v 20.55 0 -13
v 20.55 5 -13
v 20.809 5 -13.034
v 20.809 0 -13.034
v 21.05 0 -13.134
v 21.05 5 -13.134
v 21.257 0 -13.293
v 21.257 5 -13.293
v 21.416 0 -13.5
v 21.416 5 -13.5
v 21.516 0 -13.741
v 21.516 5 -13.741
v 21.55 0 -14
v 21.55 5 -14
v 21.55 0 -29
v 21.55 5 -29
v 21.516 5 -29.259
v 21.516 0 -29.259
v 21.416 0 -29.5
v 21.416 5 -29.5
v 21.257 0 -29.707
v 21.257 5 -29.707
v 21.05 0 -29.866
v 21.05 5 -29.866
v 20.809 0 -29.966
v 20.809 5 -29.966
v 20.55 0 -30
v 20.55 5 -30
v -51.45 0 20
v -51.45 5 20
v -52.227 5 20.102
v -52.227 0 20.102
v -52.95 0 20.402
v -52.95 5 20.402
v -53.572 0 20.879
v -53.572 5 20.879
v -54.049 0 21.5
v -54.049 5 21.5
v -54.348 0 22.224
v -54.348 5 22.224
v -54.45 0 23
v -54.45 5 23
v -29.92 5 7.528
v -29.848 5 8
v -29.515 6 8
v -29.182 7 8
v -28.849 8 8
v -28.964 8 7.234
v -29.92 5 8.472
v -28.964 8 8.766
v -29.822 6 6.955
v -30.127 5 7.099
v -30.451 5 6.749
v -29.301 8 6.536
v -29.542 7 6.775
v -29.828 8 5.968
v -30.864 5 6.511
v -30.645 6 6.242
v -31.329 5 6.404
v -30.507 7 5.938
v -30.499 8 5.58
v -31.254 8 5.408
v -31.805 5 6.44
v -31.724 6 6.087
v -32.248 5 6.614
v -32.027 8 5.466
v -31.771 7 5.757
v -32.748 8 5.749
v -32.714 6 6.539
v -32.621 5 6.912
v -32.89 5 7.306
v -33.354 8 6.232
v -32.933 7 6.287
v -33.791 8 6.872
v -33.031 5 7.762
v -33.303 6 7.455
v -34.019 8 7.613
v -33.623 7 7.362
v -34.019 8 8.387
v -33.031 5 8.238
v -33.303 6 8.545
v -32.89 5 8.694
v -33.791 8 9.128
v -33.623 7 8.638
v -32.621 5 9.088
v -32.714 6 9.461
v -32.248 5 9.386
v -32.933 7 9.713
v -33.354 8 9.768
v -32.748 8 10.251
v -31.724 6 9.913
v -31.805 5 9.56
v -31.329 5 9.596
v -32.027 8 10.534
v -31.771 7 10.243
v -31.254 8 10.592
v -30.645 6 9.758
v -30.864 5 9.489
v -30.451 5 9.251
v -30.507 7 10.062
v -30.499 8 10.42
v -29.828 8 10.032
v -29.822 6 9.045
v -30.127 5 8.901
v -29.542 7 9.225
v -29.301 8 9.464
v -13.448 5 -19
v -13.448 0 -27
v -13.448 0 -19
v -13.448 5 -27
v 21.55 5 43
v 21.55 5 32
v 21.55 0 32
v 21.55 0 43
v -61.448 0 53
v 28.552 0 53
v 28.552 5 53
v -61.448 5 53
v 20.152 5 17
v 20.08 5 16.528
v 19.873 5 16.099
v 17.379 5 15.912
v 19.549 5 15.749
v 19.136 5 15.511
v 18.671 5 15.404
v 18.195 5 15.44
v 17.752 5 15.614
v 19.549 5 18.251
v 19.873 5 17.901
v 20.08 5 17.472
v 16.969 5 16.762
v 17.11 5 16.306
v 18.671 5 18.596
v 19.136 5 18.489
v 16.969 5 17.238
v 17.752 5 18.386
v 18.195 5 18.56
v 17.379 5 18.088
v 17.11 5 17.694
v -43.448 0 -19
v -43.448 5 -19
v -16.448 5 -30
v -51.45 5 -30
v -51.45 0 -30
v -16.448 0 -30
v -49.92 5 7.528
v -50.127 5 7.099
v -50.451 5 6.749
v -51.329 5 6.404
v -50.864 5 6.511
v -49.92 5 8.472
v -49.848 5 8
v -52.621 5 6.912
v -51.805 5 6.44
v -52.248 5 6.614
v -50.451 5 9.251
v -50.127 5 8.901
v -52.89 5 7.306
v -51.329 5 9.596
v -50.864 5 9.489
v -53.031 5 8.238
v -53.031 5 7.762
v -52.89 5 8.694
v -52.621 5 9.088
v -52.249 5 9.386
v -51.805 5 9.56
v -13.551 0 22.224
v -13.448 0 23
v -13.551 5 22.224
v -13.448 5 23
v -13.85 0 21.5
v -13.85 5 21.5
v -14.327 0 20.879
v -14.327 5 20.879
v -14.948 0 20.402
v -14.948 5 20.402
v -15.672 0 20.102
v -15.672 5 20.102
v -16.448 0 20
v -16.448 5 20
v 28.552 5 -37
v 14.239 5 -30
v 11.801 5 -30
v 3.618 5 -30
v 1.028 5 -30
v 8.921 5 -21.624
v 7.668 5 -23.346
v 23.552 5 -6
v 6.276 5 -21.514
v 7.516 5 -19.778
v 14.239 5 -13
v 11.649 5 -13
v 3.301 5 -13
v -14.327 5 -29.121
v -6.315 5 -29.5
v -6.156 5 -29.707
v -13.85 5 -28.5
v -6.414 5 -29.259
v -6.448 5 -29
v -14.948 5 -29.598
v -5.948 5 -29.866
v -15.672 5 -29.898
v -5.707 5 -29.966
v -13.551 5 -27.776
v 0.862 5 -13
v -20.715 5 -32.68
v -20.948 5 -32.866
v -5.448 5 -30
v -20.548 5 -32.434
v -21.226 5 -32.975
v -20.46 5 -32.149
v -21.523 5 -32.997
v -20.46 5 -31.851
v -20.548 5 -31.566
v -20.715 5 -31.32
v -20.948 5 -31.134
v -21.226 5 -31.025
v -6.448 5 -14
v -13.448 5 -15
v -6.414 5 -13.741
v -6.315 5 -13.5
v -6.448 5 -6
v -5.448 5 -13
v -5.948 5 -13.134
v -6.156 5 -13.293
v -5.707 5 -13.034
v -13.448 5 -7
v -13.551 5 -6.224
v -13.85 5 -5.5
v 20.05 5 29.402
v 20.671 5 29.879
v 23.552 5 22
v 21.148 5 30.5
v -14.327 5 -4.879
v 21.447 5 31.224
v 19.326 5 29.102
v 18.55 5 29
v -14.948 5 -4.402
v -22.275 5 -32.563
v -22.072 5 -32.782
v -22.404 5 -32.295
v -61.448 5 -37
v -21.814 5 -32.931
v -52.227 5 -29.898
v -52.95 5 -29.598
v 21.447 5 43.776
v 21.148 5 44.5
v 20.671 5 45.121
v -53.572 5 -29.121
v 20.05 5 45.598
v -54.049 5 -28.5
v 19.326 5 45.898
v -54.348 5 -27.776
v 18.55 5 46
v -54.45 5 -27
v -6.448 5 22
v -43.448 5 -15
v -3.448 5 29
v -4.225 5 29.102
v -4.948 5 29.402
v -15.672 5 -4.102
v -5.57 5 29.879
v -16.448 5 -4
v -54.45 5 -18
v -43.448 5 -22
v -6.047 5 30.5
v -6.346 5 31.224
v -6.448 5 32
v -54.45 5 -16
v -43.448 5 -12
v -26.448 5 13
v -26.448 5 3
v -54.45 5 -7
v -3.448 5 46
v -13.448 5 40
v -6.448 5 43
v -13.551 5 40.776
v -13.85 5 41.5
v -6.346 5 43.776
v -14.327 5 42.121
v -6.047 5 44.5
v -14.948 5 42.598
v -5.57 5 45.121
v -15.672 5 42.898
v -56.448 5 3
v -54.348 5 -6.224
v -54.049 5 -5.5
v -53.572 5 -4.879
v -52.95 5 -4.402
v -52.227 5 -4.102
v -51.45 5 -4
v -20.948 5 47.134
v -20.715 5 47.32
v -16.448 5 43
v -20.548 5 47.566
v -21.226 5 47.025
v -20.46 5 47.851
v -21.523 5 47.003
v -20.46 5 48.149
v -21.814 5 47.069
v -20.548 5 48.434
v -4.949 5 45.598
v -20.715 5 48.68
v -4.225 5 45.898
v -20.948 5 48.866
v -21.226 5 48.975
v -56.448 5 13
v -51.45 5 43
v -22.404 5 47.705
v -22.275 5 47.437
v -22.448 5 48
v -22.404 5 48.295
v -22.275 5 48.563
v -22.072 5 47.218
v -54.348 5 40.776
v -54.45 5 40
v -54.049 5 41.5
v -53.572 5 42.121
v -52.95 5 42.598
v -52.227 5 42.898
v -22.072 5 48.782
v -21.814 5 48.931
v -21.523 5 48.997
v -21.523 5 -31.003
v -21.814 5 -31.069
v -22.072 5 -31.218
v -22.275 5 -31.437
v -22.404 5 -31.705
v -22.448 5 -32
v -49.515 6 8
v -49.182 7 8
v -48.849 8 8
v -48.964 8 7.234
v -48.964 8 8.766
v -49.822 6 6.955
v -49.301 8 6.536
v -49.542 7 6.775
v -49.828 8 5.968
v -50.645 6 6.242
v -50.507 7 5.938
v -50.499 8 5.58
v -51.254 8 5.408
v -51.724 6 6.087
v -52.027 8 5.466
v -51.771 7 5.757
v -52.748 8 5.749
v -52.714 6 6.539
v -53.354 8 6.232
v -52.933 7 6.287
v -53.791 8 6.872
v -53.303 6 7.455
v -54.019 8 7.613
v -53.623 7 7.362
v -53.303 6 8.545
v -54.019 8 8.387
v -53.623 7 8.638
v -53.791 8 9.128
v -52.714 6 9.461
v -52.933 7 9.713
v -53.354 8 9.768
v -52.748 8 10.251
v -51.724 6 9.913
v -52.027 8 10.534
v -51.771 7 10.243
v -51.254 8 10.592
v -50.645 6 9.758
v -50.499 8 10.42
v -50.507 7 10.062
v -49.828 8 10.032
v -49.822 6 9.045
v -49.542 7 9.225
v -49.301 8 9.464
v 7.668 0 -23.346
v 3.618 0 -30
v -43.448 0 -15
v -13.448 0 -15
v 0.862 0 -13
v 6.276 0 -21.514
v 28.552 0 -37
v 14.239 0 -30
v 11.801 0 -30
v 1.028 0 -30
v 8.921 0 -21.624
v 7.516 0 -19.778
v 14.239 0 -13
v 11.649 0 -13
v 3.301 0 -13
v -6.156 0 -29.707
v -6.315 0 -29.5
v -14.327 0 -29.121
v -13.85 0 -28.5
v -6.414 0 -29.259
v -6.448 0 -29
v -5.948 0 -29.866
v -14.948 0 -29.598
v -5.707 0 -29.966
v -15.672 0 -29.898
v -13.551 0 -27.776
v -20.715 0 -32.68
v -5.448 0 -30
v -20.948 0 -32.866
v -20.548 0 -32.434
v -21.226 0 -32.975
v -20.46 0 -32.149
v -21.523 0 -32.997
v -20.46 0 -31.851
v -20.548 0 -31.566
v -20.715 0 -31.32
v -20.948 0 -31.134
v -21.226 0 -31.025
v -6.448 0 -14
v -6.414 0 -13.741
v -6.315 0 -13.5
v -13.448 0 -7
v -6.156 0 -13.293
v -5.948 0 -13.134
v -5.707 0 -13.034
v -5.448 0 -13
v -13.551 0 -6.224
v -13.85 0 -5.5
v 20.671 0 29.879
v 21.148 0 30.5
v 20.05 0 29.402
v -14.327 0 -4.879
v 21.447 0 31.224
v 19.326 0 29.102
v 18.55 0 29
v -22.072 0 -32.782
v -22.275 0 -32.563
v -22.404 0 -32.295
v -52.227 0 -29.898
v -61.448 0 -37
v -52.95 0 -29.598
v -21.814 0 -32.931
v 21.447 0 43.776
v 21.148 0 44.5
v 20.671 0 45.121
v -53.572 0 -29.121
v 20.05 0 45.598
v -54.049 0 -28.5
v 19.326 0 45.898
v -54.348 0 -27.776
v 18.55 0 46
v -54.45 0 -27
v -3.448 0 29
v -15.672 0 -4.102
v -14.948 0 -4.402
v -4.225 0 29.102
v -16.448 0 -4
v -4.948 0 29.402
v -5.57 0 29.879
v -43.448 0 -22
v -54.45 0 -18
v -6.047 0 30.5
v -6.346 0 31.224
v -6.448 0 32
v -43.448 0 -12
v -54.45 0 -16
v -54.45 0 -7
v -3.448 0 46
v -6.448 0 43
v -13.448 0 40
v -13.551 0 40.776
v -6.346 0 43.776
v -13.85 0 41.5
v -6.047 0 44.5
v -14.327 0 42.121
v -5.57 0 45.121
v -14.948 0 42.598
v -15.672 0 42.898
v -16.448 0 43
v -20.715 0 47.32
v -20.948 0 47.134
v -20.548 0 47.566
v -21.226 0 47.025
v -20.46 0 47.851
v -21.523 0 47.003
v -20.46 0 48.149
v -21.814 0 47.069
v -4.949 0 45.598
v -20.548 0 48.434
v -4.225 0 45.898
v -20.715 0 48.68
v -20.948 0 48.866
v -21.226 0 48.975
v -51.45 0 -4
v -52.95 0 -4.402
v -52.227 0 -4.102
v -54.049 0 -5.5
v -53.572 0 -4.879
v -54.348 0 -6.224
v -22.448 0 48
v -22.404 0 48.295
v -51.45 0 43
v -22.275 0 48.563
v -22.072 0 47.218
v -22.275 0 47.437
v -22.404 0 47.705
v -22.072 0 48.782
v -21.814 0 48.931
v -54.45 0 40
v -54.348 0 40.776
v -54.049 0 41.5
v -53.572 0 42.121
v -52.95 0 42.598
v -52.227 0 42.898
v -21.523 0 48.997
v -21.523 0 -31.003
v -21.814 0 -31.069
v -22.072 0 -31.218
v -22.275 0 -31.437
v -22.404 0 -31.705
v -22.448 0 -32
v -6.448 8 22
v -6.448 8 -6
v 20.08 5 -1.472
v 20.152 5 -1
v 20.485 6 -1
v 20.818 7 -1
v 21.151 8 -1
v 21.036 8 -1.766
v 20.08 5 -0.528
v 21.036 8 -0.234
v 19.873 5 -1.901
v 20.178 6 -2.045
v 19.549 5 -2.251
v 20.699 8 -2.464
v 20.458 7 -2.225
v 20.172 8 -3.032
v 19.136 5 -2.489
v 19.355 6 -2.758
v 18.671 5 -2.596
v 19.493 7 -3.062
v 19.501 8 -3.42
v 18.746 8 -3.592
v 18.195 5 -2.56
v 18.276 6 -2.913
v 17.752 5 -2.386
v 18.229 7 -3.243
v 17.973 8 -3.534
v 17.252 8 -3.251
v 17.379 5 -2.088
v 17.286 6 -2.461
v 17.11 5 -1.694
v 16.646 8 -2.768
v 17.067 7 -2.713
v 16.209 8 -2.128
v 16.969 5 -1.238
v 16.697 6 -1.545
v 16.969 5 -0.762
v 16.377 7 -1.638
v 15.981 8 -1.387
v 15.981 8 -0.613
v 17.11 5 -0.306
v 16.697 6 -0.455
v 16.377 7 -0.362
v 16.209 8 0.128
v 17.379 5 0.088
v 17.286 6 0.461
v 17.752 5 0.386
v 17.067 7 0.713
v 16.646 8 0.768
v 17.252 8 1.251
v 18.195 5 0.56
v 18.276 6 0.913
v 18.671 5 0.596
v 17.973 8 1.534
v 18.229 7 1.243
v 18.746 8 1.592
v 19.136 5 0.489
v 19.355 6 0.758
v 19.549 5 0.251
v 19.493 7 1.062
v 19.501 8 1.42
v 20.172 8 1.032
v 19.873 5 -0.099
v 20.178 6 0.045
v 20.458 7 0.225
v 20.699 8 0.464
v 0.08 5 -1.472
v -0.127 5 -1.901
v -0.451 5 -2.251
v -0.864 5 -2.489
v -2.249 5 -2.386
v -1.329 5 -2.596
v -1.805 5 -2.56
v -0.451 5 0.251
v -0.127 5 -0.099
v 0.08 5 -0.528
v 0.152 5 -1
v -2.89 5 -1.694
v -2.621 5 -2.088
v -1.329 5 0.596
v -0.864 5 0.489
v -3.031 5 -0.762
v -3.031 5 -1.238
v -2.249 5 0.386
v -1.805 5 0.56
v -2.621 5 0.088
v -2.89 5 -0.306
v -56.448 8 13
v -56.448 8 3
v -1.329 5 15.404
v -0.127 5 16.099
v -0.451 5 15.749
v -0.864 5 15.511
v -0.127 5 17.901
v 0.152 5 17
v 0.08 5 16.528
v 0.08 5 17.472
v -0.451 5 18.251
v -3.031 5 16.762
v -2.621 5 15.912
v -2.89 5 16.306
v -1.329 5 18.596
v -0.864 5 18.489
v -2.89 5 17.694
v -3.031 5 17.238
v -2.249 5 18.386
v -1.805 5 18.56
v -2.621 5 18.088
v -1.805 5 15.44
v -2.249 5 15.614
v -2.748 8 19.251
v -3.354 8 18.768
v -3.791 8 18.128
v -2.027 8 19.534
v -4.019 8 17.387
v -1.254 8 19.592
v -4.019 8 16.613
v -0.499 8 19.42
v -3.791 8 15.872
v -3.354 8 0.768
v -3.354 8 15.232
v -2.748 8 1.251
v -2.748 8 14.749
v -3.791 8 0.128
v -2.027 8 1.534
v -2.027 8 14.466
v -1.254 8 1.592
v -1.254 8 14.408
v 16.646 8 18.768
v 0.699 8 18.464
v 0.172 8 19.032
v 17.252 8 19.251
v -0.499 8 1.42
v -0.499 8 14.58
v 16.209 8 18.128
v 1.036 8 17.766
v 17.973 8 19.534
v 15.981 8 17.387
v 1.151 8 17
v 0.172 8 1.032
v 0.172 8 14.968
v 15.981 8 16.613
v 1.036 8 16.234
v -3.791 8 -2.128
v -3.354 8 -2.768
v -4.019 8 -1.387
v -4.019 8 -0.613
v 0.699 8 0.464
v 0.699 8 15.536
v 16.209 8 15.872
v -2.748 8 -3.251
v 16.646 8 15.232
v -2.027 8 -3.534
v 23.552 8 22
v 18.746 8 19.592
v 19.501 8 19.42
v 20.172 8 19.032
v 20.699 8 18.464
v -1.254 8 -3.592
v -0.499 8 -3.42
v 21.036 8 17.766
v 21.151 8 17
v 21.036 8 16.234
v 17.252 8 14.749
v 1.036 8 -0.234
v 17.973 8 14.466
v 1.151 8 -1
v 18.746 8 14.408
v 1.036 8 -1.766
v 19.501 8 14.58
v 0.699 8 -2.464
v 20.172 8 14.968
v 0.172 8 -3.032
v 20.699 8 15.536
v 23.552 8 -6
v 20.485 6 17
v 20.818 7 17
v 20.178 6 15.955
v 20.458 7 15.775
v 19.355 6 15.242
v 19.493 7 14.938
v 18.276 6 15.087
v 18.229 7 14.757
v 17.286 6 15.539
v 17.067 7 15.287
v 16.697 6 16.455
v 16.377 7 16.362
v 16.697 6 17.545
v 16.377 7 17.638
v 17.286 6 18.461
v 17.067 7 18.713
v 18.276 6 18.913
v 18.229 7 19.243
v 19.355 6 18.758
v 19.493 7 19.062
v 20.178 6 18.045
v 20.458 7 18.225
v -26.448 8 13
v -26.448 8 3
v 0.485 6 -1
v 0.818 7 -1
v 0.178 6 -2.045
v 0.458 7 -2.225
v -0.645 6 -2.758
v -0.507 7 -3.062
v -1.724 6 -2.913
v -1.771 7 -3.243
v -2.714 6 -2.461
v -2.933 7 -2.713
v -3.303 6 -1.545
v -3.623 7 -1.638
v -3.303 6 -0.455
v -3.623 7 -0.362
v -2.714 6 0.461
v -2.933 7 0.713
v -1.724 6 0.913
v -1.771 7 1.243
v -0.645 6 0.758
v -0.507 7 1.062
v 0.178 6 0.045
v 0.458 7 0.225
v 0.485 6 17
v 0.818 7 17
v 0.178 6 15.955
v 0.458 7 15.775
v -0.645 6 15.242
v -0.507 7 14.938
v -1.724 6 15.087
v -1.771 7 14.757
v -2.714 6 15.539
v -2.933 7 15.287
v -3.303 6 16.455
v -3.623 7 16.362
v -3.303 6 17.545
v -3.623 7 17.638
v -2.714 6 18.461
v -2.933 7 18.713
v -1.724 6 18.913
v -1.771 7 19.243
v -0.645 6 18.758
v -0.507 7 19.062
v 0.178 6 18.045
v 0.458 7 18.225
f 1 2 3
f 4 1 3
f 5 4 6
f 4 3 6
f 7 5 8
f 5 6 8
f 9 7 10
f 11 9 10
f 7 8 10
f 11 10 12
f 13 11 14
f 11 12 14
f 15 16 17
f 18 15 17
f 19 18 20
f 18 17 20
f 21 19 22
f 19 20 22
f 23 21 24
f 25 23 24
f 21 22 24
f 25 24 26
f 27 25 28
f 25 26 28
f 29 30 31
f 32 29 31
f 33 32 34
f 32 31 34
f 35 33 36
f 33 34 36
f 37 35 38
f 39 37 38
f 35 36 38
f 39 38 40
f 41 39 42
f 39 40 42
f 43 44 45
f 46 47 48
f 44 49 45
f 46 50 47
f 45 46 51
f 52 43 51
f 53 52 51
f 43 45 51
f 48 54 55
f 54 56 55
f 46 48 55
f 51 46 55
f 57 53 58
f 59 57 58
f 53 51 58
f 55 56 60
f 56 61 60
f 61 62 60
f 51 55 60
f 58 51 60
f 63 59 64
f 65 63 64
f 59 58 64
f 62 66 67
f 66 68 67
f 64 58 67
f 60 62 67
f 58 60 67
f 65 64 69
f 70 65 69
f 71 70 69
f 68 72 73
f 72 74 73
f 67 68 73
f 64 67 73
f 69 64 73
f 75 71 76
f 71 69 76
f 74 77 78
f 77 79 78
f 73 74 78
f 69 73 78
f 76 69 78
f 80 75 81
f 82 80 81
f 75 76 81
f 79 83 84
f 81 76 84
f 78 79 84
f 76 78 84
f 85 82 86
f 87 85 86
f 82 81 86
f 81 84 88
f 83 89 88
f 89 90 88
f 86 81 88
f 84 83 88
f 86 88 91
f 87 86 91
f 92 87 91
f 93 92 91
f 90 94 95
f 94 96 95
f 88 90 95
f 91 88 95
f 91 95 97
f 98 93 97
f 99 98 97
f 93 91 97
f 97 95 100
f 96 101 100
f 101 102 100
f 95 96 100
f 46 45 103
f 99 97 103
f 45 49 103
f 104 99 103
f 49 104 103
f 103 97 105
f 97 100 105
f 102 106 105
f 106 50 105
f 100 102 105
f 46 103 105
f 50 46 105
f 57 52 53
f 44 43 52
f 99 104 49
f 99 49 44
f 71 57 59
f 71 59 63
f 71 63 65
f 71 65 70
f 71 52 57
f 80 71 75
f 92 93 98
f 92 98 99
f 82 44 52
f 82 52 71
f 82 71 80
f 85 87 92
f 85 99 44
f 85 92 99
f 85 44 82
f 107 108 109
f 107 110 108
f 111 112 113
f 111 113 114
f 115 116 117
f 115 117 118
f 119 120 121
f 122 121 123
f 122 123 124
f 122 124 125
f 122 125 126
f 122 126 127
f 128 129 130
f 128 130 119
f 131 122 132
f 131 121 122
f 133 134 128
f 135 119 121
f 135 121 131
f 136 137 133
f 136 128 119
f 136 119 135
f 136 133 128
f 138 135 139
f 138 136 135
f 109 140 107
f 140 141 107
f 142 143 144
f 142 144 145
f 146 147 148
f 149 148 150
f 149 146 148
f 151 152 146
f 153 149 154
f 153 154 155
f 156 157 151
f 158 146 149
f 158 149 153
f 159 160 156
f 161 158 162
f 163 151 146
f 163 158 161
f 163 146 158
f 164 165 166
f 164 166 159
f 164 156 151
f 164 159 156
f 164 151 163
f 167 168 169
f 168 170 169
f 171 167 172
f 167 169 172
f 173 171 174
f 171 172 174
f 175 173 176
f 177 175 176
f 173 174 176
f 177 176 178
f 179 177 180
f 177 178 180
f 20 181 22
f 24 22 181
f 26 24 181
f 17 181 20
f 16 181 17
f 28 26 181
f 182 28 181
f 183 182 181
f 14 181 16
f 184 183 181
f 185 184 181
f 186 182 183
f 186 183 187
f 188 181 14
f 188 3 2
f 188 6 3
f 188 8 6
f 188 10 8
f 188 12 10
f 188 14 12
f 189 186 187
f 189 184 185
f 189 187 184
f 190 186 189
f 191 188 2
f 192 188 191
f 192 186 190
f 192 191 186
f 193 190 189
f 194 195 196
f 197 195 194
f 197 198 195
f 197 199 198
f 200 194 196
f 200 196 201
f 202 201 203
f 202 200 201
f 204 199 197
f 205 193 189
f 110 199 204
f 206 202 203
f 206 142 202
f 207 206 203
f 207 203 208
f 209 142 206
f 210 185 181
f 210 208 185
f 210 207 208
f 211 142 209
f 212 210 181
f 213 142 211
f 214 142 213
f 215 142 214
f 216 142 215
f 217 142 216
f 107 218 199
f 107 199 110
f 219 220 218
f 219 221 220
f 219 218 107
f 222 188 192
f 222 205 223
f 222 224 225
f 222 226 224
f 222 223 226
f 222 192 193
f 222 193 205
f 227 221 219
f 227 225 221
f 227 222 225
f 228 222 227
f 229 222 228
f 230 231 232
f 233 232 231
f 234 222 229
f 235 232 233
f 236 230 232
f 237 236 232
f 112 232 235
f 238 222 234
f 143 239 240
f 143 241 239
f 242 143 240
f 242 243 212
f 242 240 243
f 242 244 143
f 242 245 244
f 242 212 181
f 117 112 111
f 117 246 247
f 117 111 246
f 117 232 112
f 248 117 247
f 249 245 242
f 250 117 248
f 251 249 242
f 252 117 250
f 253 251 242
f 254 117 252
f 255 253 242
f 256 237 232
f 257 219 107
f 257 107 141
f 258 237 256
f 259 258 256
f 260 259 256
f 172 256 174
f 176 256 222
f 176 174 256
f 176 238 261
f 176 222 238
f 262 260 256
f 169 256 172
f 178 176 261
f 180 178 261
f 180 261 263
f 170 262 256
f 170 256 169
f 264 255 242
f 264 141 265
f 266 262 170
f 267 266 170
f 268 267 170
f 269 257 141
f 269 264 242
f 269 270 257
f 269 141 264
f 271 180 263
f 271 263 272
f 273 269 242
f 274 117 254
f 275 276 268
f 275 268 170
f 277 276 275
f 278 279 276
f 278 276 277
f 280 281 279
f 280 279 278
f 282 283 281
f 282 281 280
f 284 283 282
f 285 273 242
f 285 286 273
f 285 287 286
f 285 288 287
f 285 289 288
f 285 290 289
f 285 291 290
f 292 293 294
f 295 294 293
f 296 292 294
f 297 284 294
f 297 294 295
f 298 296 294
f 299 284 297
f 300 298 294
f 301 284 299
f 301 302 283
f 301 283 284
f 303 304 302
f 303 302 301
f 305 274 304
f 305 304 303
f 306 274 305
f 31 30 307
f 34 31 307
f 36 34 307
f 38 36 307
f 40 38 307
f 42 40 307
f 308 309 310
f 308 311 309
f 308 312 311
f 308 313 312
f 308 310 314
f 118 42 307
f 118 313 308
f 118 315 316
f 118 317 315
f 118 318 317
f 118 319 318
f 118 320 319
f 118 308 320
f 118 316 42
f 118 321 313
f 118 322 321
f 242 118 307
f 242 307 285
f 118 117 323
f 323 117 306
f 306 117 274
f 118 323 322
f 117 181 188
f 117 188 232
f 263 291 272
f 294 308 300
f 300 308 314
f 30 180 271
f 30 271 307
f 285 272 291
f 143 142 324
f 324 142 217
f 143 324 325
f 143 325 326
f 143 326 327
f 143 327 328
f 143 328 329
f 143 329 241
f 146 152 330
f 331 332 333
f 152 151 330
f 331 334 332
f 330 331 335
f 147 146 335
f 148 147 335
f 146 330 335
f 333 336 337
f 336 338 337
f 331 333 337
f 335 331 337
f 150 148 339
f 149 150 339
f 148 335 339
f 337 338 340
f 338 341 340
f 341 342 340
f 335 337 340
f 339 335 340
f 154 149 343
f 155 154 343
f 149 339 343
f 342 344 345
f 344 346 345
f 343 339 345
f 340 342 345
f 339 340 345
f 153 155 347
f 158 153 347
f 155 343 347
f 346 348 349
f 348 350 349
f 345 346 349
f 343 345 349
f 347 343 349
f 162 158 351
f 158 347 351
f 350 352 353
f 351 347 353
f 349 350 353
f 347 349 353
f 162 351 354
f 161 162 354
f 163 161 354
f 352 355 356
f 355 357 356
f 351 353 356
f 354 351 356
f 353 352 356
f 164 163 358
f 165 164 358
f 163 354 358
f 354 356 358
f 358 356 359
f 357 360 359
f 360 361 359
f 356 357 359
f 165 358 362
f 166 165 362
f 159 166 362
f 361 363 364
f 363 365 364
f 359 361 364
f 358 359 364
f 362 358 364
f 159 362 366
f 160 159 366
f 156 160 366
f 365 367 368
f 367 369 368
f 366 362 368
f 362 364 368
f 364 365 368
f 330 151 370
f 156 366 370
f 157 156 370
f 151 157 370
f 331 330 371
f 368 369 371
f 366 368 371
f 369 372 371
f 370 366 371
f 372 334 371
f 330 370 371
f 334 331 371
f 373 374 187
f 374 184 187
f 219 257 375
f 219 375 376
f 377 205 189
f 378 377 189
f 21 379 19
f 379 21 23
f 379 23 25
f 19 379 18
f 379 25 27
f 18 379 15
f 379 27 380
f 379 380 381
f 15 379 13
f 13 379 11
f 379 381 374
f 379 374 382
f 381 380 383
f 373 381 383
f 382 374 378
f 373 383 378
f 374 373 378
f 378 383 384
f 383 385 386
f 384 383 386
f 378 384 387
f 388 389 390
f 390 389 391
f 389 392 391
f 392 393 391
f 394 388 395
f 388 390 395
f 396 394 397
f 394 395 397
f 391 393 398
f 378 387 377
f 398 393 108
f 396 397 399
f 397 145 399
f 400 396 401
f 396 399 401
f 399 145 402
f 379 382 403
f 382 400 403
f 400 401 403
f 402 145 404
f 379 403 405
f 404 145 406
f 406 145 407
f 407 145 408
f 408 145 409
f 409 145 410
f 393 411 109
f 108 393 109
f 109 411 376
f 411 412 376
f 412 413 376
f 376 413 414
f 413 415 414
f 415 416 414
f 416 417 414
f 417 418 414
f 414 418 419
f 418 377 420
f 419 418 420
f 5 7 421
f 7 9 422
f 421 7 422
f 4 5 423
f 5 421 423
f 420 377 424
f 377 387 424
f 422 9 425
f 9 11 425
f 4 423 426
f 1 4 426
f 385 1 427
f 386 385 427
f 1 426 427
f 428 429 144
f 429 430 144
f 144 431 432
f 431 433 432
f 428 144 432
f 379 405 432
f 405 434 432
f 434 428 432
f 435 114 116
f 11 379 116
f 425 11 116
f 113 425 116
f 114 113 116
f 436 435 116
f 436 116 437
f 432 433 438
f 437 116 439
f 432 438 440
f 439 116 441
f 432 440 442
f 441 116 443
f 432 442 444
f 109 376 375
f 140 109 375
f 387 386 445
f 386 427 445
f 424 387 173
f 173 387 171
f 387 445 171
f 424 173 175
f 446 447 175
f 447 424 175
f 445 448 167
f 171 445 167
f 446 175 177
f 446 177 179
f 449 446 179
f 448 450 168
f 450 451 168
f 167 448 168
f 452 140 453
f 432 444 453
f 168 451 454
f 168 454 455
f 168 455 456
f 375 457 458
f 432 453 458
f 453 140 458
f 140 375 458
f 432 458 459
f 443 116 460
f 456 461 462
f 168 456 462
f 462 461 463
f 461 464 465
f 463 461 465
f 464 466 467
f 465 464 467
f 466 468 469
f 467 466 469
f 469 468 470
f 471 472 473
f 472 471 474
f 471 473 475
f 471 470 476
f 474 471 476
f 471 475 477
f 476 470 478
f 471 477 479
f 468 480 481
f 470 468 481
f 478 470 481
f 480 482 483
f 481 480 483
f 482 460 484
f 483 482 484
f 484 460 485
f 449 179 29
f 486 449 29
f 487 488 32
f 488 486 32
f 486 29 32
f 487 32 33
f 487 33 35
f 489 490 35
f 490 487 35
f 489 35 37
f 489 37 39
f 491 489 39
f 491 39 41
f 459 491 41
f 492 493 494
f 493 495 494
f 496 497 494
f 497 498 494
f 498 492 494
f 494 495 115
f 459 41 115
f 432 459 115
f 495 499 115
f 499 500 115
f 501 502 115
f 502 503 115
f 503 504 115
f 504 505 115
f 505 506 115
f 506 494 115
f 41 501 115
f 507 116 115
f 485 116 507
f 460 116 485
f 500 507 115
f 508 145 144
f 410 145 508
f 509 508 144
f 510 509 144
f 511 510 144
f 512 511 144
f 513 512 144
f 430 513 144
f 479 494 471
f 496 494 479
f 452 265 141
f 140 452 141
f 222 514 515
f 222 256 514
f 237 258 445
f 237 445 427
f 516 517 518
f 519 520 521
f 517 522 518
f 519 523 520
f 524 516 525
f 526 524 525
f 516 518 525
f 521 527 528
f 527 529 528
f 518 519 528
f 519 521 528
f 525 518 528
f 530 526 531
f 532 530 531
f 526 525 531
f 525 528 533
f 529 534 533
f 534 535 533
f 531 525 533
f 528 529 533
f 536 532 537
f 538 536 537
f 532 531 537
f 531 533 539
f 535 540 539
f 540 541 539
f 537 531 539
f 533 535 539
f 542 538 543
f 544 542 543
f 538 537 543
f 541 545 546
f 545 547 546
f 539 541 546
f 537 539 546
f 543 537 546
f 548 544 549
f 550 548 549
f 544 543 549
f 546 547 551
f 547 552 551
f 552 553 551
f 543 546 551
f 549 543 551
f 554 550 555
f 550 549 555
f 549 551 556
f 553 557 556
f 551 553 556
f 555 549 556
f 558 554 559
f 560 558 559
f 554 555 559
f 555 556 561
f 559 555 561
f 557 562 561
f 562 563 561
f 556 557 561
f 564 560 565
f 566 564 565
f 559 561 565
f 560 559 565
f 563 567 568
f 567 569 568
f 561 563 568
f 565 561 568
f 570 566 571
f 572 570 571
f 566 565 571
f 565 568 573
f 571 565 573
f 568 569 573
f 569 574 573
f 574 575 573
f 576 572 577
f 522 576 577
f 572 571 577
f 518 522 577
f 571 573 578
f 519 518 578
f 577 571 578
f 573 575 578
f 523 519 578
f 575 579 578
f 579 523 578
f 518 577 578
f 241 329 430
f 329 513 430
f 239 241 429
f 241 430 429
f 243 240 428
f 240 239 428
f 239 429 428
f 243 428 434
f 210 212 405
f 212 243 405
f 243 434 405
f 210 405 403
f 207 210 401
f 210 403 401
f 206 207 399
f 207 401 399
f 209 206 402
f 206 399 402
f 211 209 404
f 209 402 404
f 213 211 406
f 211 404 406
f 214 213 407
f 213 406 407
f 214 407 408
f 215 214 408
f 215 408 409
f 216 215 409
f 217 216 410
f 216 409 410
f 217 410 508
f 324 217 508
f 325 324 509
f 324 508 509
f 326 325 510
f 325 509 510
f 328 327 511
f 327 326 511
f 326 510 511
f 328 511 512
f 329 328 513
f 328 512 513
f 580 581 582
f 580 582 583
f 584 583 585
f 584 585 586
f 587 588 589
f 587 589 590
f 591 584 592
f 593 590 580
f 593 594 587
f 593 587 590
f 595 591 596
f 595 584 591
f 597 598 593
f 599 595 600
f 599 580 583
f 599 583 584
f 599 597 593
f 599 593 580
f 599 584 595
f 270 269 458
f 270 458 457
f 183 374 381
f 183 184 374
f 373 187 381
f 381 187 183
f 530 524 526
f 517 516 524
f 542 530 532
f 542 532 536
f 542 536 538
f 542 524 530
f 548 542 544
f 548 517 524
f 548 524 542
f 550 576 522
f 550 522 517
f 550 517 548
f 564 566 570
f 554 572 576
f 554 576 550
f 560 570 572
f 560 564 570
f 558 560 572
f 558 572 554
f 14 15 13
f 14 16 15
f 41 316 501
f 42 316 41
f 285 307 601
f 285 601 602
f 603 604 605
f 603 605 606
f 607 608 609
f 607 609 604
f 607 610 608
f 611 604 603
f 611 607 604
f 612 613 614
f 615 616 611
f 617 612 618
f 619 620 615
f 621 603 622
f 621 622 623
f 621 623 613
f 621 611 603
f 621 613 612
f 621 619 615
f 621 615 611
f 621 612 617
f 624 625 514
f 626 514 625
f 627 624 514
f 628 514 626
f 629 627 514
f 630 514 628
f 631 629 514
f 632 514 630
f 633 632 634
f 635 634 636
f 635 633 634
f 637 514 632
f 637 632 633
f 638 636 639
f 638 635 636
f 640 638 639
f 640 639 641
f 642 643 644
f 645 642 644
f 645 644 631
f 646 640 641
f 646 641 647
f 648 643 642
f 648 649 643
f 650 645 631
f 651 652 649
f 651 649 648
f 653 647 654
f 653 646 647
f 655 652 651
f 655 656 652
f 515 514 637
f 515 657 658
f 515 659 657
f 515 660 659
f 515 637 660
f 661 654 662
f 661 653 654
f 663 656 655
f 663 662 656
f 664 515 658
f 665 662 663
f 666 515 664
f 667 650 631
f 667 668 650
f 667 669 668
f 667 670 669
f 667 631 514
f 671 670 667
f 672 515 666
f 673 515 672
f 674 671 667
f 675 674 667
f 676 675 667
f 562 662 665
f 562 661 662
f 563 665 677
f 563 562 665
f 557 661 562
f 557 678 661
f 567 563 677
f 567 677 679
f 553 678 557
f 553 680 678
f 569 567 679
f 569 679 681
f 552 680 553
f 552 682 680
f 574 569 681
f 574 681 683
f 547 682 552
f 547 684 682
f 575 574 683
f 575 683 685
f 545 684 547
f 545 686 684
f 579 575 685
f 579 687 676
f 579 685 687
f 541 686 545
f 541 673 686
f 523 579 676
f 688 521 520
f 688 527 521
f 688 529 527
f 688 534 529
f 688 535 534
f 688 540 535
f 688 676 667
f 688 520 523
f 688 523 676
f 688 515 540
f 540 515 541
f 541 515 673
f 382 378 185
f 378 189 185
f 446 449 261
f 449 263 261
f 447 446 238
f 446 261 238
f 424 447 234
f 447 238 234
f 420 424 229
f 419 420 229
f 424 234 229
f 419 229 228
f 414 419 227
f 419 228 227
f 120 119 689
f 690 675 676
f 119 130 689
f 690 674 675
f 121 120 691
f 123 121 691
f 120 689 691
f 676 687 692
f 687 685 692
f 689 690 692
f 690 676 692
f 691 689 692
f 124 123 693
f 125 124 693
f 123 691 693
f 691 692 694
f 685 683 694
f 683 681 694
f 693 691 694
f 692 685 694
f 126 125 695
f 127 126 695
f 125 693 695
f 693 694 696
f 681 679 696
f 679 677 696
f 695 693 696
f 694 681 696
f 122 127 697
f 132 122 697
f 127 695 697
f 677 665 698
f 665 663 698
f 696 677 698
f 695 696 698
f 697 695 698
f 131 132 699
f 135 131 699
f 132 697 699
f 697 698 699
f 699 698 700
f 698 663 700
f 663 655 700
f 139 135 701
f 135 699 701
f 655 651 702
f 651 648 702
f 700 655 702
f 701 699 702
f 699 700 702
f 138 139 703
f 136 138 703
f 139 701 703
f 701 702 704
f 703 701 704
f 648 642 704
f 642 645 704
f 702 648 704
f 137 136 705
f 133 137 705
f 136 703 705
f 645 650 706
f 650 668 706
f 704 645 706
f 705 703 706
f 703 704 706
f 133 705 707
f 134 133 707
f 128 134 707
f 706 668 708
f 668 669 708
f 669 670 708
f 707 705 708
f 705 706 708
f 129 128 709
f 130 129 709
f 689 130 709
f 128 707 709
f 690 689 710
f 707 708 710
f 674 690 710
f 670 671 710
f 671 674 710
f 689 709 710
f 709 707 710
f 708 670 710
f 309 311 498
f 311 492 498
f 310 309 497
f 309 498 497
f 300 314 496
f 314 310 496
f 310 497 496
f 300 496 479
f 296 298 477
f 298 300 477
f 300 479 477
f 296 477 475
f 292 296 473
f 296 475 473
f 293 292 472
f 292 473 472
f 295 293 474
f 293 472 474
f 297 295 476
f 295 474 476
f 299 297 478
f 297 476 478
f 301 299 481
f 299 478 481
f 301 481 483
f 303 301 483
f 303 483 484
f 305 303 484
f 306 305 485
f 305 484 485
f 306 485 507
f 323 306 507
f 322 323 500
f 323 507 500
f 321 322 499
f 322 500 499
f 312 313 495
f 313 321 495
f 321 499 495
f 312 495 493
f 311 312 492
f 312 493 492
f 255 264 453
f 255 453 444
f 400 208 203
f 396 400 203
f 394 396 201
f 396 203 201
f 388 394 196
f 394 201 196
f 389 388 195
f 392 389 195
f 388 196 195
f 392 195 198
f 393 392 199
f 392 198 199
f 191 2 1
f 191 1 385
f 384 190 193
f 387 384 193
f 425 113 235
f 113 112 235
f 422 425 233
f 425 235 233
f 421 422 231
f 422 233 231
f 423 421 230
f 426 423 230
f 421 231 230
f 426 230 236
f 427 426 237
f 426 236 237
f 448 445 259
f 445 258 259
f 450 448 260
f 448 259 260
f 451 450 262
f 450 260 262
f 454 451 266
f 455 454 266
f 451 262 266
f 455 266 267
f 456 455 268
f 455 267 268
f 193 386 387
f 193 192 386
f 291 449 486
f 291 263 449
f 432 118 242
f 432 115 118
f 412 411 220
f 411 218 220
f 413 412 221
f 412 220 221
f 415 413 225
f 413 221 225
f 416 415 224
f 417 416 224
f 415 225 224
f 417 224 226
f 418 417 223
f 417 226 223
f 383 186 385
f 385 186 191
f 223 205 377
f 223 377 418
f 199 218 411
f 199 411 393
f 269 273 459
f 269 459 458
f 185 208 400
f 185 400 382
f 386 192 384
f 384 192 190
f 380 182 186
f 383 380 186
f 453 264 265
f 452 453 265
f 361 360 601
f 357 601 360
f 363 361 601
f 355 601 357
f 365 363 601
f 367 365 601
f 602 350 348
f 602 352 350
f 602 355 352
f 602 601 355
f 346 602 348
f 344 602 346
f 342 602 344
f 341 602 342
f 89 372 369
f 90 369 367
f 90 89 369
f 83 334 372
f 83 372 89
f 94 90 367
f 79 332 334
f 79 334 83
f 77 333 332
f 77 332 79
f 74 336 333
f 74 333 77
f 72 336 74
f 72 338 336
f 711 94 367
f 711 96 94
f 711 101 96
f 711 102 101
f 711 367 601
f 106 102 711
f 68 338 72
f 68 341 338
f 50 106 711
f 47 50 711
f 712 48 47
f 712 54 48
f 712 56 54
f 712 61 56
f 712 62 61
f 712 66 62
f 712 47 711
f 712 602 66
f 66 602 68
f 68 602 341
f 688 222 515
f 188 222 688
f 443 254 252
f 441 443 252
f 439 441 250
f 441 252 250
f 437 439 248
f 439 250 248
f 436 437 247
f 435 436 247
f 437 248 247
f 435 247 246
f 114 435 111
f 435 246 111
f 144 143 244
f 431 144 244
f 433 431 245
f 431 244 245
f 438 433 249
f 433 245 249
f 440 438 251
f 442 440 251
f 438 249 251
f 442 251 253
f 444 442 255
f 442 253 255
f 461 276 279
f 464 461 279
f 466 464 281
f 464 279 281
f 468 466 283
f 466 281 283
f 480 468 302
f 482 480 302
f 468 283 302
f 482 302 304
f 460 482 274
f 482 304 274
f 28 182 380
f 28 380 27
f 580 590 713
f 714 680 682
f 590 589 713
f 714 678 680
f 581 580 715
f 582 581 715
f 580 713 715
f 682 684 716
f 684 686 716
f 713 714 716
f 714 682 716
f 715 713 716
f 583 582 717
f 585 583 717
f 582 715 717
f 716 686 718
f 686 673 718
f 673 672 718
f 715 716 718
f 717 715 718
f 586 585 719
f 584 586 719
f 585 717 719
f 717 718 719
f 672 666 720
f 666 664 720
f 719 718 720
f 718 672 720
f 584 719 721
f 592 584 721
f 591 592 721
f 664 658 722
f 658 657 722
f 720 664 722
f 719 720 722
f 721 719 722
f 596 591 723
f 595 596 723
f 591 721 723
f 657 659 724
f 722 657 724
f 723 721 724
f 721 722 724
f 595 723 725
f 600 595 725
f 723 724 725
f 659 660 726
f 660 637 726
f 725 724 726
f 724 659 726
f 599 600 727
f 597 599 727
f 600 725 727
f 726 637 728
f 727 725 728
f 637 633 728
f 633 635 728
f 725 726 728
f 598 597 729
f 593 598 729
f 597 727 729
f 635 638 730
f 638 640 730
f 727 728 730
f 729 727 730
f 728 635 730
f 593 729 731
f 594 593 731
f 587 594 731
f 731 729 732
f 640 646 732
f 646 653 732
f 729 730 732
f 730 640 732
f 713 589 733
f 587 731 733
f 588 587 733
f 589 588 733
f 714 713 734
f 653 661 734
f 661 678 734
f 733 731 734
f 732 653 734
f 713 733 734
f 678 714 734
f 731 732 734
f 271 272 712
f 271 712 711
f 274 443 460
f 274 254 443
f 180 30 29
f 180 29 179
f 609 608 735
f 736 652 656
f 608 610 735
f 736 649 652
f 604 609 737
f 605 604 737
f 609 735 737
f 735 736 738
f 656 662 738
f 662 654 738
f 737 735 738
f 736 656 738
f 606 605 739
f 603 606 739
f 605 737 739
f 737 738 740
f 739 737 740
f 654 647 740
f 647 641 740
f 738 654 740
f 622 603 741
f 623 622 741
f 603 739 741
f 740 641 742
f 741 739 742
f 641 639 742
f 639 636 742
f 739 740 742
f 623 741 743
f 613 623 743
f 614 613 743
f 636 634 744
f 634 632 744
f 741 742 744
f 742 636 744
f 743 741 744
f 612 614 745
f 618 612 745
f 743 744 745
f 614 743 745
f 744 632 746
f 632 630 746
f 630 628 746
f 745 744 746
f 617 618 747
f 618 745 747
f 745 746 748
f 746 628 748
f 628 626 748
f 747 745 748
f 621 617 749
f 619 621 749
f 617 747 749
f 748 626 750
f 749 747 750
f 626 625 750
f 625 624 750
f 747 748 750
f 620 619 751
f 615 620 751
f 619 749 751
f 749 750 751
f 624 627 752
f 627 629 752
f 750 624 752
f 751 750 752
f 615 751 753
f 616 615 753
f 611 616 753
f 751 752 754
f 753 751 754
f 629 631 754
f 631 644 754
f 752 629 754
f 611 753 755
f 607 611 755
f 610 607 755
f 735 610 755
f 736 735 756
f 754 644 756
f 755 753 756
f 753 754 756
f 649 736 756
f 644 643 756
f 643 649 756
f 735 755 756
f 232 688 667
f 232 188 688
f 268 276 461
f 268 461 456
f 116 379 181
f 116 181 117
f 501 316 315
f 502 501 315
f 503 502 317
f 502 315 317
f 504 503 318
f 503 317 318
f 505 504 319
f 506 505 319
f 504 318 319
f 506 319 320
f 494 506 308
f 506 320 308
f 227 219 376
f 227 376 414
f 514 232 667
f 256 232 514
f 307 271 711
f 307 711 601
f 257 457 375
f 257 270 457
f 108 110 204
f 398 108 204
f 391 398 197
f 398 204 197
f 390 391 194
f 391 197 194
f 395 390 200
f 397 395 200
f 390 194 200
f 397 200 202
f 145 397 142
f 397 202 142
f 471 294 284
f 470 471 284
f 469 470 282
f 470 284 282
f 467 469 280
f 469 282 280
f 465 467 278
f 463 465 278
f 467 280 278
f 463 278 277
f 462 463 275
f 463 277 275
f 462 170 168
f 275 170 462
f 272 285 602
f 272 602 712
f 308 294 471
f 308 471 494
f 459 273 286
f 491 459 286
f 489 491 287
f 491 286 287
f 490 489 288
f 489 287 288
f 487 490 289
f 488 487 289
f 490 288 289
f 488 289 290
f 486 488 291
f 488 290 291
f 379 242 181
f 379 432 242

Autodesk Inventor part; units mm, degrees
ref_plane "YZ Plane" through (0, 0, 0) normal (1, 0, 0) x (0, 1, 0)
ref_plane "Arbeitsebene1" through (-21.4485, 99.4, 5.4) normal (-1, 0, 0) x (0, -0.6026, -0.798)
sketch "center1" plane through (-21.4485, 99.4, 5.4) normal (-1, 0, 0) x (0, -0.6026, -0.798)
  line L0 (125.8462, -4.4299) -> (-42.8597, 122.9603)
  line L1 (111.6965, 152.237) -> (-23.2865, -26.5243)
  point P0 (64.2081, 76.0713)
ref_plane "Arbeitsebene2" through (53.5515, 27.1, 8) normal (0, 0, -1) x (0, 1, 0)
sketch "center2" plane through (53.5515, 27.1, 8) normal (0, 0, -1) x (0, 1, 0)
  line L0 (0, 239.86) -> (0, -220.81)
  point P0 (-27.1, -53.5515)
sketch "Hallsensor" plane through (0, 0, 0) normal (0, 1, 0) x (-1, 0, 0)
  line L0 (21.4485, 13) -> (41.4485, 13) construction
  line L1 (41.4485, 13) -> (41.4485, 3) construction
  line L2 (41.4485, 3) -> (21.4485, 3) construction
  line L3 (21.4485, 3) -> (21.4485, 13) construction
  line L4 (21.4485, -97.7) -> (21.4485, 113.7) construction
  line L5 (-293.4115, 8) -> (167.2585, 8) construction
  line L6 (40.4485, 4) -> (42.4485, 4)
  line L7 (42.4485, 4) -> (42.4485, 2)
  line L8 (42.4485, 2) -> (40.4485, 2)
  line L9 (40.4485, 2) -> (40.4485, 4)
  line L10 (40.4485, 4) -> (42.4485, 2) construction
  line L11 (42.4485, 4) -> (40.4485, 2) construction
  line L12 (22.4485, 4) -> (20.4485, 4)
  line L13 (20.4485, 4) -> (20.4485, 2)
  line L14 (20.4485, 2) -> (22.4485, 2)
  line L15 (22.4485, 2) -> (22.4485, 4)
  line L16 (22.4485, 4) -> (20.4485, 2) construction
  line L17 (20.4485, 4) -> (22.4485, 2) construction
  line L18 (22.4485, 14) -> (20.4485, 14)
  line L19 (20.4485, 14) -> (20.4485, 12)
  line L20 (20.4485, 12) -> (22.4485, 12)
  line L21 (22.4485, 12) -> (22.4485, 14)
  line L22 (22.4485, 14) -> (20.4485, 12) construction
  line L23 (20.4485, 14) -> (22.4485, 12) construction
  line L24 (42.4485, 14) -> (40.4485, 14)
  line L25 (40.4485, 14) -> (40.4485, 12)
  line L26 (40.4485, 12) -> (42.4485, 12)
  line L27 (42.4485, 12) -> (42.4485, 14)
  line L28 (42.4485, 14) -> (40.4485, 12) construction
  line L29 (40.4485, 14) -> (42.4485, 12) construction
  line L30 (51.4485, -1) -> (1.4485, -1) construction
  line L31 (1.4485, -1) -> (1.4485, 17) construction
  line L32 (1.4485, 17) -> (51.4485, 17) construction
  line L33 (51.4485, 17) -> (51.4485, -1) construction
  circle A0 centre (51.4485, 8) radius 1.5
  circle A1 centre (1.4485, -1) radius 1.5
  circle A2 centre (1.4485, 17) radius 1.5
  point P0 (0, 0)
  point P1 (21.4485, 3)
  point P2 (21.4485, 3)
  dimension "d70" = 20
  dimension "d71" = 10
  dimension "d72" = 2
  dimension "d73" = 4
  dimension "d74" = 4
  dimension "d75" = 20
  dimension "d76" = 10
  dimension "d77" = 3
  dimension "d78" = 5
sketch "Groundplane" plane through (0, 0, 0) normal (0, 1, 0) x (-1, 0, 0)
  line L0 (-293.4115, 8) -> (167.2585, 8) construction
  line L1 (21.4485, -97.7) -> (21.4485, 113.7) construction
  arc A0 (22.4485, -32) -> (20.4485, -32) centre (21.4485, -32) ccw construction
  line L2 (22.4485, -32) -> (20.4485, -32) construction
  line L3 (20.4485, -32) -> (20.4485, -37) construction
  line L4 (20.4485, -37) -> (22.4485, -37) construction
  line L5 (22.4485, -37) -> (22.4485, -32) construction
  arc A1 (20.4485, 48) -> (22.4485, 48) centre (21.4485, 48) ccw construction
  line L6 (20.4485, 48) -> (22.4485, 48) construction
  line L7 (22.4485, 48) -> (22.4485, 53) construction
  line L8 (22.4485, 53) -> (20.4485, 53) construction
  line L9 (20.4485, 53) -> (20.4485, 48) construction
  line L10 (61.4485, -37) -> (-28.5515, -37) construction
  line L11 (-28.5515, -37) -> (-28.5515, 53) construction
  line L12 (-28.5515, 53) -> (61.4485, 53) construction
  line L13 (61.4485, 53) -> (61.4485, -37) construction
  dimension "d87" = 5
  dimension "d88" = 2
  dimension "d89" = 2
  dimension "d90" = 5
  dimension "d91" = 90
  dimension "d92" = 45
  dimension "d97" = 50
  dimension "d98" = 90
sketch "Montagepunkte" plane through (0, 0, 0) normal (0, 1, 0) x (-1, 0, 0)
  circle A0 centre (51.4485, 8) radius 1.5 construction
  circle A1 centre (1.4485, -1) radius 1.5 construction
  circle A2 centre (1.4485, 17) radius 1.5 construction
  line L0 (1.4485, -1) -> (-18.5515, -1) construction
  line L1 (-18.5515, -1) -> (-18.5515, 17) construction
  line L2 (-18.5515, 17) -> (1.4485, 17) construction
  line L3 (1.4485, 17) -> (1.4485, -1) construction
  line L4 (51.4485, 8) -> (31.4485, 8) construction
  circle A3 centre (31.4485, 8) radius 1.6
  circle A4 centre (51.4485, 8) radius 1.6
  circle A5 centre (1.4485, -1) radius 1.6
  circle A6 centre (1.4485, 17) radius 1.6
  circle A7 centre (-18.5515, 17) radius 1.6
  circle A8 centre (-18.5515, -1) radius 1.6
  arc A9 (22.4485, -32) -> (20.4485, -32) centre (21.4485, -32) ccw construction
  arc A10 (20.4485, 48) -> (22.4485, 48) centre (21.4485, 48) ccw construction
  circle A11 centre (21.4485, -32) radius 1
  circle A12 centre (21.4485, 48) radius 1
  dimension "d93" = 20
  dimension "d94" = 20
  dimension "d95" = 3.2
  dimension "d96" = 2
sketch "Skizze5" plane through (0, 0, 0) normal (0, 1, 0) x (-1, 0, 0)
  line L0 (-293.4115, 8) -> (167.2585, 8) construction
  circle A0 centre (21.4485, -32) radius 1 projected
  circle A1 centre (21.4485, 48) radius 1 projected
  line L1 (61.4485, -37) -> (-28.5515, -37) projected
  line L2 (61.4485, 53) -> (61.4485, -37) projected
  line L3 (-28.5515, -37) -> (-28.5515, 53) projected
  line L4 (-28.5515, 53) -> (61.4485, 53) projected
extrude "Extrusion2" add sketch "Skizze5" along normal blind 5
sketch "Skizze6" plane through (0, 5, 0) normal (0, 1, 0) x (1, 0, 0)
  line L0 (-56.4485, -3) -> (-26.4485, -3)
  line L1 (-26.4485, -3) -> (-26.4485, -13)
  line L2 (-26.4485, -13) -> (-56.4485, -13)
  line L3 (-56.4485, -13) -> (-56.4485, -3)
  line L4 (-6.4485, 6) -> (23.5515, 6)
  line L5 (23.5515, 6) -> (23.5515, -22)
  line L6 (23.5515, -22) -> (-6.4485, -22)
  line L7 (-6.4485, -22) -> (-6.4485, 6)
  circle A0 centre (-51.4485, -8) radius 1.6 projected
  circle A1 centre (-31.4485, -8) radius 1.6 projected
  circle A2 centre (-1.4485, -17) radius 1.6 projected
  circle A3 centre (18.5515, -17) radius 1.6 projected
  circle A4 centre (18.5515, 1) radius 1.6 projected
  circle A5 centre (-1.4485, 1) radius 1.6 projected
  point P0 (0, 0)
  dimension "d99" = 5
  dimension "d100" = 5
  dimension "d101" = 5
  dimension "d102" = 5
  dimension "d103" = 5
  dimension "d104" = 5
  dimension "d105" = 5
  dimension "d106" = 5
extrude "Extrusion3" add sketch "Skizze6" along normal blind 3
chamfer "Fase1" distance 1 distance2 3 2 edges at (-53.0485, 8, 8) (-33.0485, 8, 8) measured on face at (-38.3043, 8, 4.168)
chamfer "Fase2" distance 1 distance2 3 4 edges at (-3.0485, 8, -1) (16.9515, 8, -1) (16.9515, 8, 17) (-3.0485, 8, 17) measured on face at (11.4857, 8, 5.3537)
sketch "Skizze7" plane through (0, 5, 0) normal (0, 1, 0) x (1, 0, 0)
  line L0 (-51.4505, 30) -> (-16.4485, 30)
  line L1 (-13.4485, 27) -> (-13.4485, 7)
  line L2 (-16.4485, 4) -> (-51.4505, 4)
  line L3 (-54.4505, 7) -> (-54.4505, 27)
  line L4 (-51.4505, -20) -> (-16.4485, -20)
  line L5 (-13.4485, -23) -> (-13.4485, -40)
  line L6 (-16.4485, -43) -> (-51.4505, -43)
  line L7 (-54.4505, -40) -> (-54.4505, -23)
  line L8 (-3.4485, -29) -> (18.5497, -29)
  line L9 (21.5497, -32) -> (21.5497, -43)
  line L10 (18.5497, -46) -> (-3.4485, -46)
  line L11 (-6.4485, -43) -> (-6.4485, -32)
  line L12 (28.5497, -53) -> (28.5497, 37)
  line L13 (-61.4505, -53) -> (28.5497, -53)
  line L14 (-61.4505, 37) -> (-61.4505, -53)
  line L15 (-56.4485, -13) -> (-26.4485, -13) projected
  line L16 (-6.4485, 6) -> (-6.4485, -22) projected
  line L17 (-26.4485, -3) -> (-56.4485, -3) projected
  line L18 (28.5497, 37) -> (-61.4505, 37)
  line L19 (-6.4485, -22) -> (23.5515, -22) projected
  line L20 (-5.4485, 30) -> (20.5497, 30)
  line L21 (21.5497, 29) -> (21.5497, 14)
  line L22 (20.5497, 13) -> (-5.4485, 13)
  line L23 (-6.4485, 14) -> (-6.4485, 29)
  line L24 (23.5515, 6) -> (-6.4485, 6) projected
  arc A0 (-51.4505, 30) -> (-54.4505, 27) centre (-51.4505, 27) ccw
  arc A1 (-54.4505, 7) -> (-51.4505, 4) centre (-51.4505, 7) ccw
  arc A2 (-13.4485, 27) -> (-16.4485, 30) centre (-16.4485, 27) ccw
  arc A3 (-16.4485, 4) -> (-13.4485, 7) centre (-16.4485, 7) ccw
  arc A4 (-51.4505, -20) -> (-54.4505, -23) centre (-51.4505, -23) ccw
  arc A5 (-13.4485, -23) -> (-16.4485, -20) centre (-16.4485, -23) ccw
  arc A6 (-16.4485, -43) -> (-13.4485, -40) centre (-16.4485, -40) ccw
  arc A7 (-54.4505, -40) -> (-51.4505, -43) centre (-51.4505, -40) ccw
  arc A8 (-3.4485, -29) -> (-6.4485, -32) centre (-3.4485, -32) ccw
  arc A9 (-6.4485, -43) -> (-3.4485, -46) centre (-3.4485, -43) ccw
  arc A10 (18.5497, -46) -> (21.5497, -43) centre (18.5497, -43) ccw
  arc A11 (21.5497, -32) -> (18.5497, -29) centre (18.5497, -32) ccw
  arc A12 (-5.4485, 30) -> (-6.4485, 29) centre (-5.4485, 29) ccw
  arc A13 (-6.4485, 14) -> (-5.4485, 13) centre (-5.4485, 14) ccw
  arc A14 (21.5497, 29) -> (20.5497, 30) centre (20.5497, 29) ccw
  arc A15 (20.5497, 13) -> (21.5497, 14) centre (20.5497, 14) ccw
  point P0 (0, 0)
  point P1 (-13.4485, -43)
  point P2 (-41.4485, -3)
  point P3 (-6.4485, -37.5)
  point P4 (-6.4485, 21.5)
  dimension "d42" = 7
  dimension "d43" = 7
  dimension "d44" = 7
  dimension "d45" = 10
  dimension "d46" = 7
  dimension "d47" = 7
  dimension "d48" = 7
  dimension "d49" = 7
  dimension "d50" = 7
  dimension "d51" = 7
  dimension "d52" = 7
  dimension "d53" = 7
  dimension "d54" = 7
  dimension "d55" = 7
  dimension "d56" = 7
  dimension "d57" = 7
  dimension "d58" = 3
  dimension "d59" = 3
  dimension "d60" = 1
extrude "Extrusion4" cut sketch "Skizze7" against normal through all contours L0 A2 L1 A3 L2 A1 L3 A0 | L4 A5 L5 A6 L6 A7 L7 A4 | L8 A11 L9 A10 L10 A9 L11 A8 | L20 A14 L21 A15 L22 A13 L23 A12
sketch "Skizze11" plane through (0, 5, 0) normal (0, 1, 0) x (1, 0, 0)
  line L0 (-54.4505, 7) -> (-54.4505, 27) projected
  line L1 (-13.4485, 27) -> (-13.4485, 7) projected
  line L2 (20.5497, 13) -> (-5.4485, 13) construction
  line L3 (-54.4505, 18) -> (-43.4485, 22)
  line L4 (-43.4485, 22) -> (-43.4485, 19)
  line L5 (-43.4485, 19) -> (-13.4485, 19)
  line L6 (-54.4505, 16) -> (-43.4485, 12)
  line L7 (-43.4485, 12) -> (-43.4485, 15)
  line L8 (-43.4485, 15) -> (-13.4485, 15)
  line L9 (14.239, 13) -> (11.6491, 13)
  line L10 (11.6491, 13) -> (7.5162, 19.778)
  line L11 (7.5162, 19.778) -> (3.3006, 13)
  line L12 (3.3006, 13) -> (0.8622, 13)
  line L13 (0.8622, 13) -> (6.2763, 21.5138)
  line L14 (6.2763, 21.5138) -> (1.0275, 30)
  line L15 (1.0275, 30) -> (3.6175, 30)
  line L16 (3.6175, 30) -> (7.6677, 23.346)
  line L17 (7.6677, 23.346) -> (11.8006, 30)
  line L18 (11.8006, 30) -> (14.239, 30)
  line L19 (14.239, 30) -> (8.9214, 21.624)
  line L20 (8.9214, 21.624) -> (14.239, 13)
  point P0 (0, 0)
  point P1 (-54.4505, 17)
  point P2 (-54.4505, 17)
  point P3 (-54.4505, 17)
  point P4 (-54.4505, 17)
  point P5 (-54.4505, 17)
  dimension "d108" = 4
  dimension "d109" = 2
  dimension "d110" = 30
  dimension "d111" = 3
  dimension "d112" = 3
  dimension "d113" = 1
  dimension "d114" = 1
extrude "Extrusion5" add sketch "Skizze11" against normal up to surface (5 mm away)
properties part number "HallSensor_Halterung"
